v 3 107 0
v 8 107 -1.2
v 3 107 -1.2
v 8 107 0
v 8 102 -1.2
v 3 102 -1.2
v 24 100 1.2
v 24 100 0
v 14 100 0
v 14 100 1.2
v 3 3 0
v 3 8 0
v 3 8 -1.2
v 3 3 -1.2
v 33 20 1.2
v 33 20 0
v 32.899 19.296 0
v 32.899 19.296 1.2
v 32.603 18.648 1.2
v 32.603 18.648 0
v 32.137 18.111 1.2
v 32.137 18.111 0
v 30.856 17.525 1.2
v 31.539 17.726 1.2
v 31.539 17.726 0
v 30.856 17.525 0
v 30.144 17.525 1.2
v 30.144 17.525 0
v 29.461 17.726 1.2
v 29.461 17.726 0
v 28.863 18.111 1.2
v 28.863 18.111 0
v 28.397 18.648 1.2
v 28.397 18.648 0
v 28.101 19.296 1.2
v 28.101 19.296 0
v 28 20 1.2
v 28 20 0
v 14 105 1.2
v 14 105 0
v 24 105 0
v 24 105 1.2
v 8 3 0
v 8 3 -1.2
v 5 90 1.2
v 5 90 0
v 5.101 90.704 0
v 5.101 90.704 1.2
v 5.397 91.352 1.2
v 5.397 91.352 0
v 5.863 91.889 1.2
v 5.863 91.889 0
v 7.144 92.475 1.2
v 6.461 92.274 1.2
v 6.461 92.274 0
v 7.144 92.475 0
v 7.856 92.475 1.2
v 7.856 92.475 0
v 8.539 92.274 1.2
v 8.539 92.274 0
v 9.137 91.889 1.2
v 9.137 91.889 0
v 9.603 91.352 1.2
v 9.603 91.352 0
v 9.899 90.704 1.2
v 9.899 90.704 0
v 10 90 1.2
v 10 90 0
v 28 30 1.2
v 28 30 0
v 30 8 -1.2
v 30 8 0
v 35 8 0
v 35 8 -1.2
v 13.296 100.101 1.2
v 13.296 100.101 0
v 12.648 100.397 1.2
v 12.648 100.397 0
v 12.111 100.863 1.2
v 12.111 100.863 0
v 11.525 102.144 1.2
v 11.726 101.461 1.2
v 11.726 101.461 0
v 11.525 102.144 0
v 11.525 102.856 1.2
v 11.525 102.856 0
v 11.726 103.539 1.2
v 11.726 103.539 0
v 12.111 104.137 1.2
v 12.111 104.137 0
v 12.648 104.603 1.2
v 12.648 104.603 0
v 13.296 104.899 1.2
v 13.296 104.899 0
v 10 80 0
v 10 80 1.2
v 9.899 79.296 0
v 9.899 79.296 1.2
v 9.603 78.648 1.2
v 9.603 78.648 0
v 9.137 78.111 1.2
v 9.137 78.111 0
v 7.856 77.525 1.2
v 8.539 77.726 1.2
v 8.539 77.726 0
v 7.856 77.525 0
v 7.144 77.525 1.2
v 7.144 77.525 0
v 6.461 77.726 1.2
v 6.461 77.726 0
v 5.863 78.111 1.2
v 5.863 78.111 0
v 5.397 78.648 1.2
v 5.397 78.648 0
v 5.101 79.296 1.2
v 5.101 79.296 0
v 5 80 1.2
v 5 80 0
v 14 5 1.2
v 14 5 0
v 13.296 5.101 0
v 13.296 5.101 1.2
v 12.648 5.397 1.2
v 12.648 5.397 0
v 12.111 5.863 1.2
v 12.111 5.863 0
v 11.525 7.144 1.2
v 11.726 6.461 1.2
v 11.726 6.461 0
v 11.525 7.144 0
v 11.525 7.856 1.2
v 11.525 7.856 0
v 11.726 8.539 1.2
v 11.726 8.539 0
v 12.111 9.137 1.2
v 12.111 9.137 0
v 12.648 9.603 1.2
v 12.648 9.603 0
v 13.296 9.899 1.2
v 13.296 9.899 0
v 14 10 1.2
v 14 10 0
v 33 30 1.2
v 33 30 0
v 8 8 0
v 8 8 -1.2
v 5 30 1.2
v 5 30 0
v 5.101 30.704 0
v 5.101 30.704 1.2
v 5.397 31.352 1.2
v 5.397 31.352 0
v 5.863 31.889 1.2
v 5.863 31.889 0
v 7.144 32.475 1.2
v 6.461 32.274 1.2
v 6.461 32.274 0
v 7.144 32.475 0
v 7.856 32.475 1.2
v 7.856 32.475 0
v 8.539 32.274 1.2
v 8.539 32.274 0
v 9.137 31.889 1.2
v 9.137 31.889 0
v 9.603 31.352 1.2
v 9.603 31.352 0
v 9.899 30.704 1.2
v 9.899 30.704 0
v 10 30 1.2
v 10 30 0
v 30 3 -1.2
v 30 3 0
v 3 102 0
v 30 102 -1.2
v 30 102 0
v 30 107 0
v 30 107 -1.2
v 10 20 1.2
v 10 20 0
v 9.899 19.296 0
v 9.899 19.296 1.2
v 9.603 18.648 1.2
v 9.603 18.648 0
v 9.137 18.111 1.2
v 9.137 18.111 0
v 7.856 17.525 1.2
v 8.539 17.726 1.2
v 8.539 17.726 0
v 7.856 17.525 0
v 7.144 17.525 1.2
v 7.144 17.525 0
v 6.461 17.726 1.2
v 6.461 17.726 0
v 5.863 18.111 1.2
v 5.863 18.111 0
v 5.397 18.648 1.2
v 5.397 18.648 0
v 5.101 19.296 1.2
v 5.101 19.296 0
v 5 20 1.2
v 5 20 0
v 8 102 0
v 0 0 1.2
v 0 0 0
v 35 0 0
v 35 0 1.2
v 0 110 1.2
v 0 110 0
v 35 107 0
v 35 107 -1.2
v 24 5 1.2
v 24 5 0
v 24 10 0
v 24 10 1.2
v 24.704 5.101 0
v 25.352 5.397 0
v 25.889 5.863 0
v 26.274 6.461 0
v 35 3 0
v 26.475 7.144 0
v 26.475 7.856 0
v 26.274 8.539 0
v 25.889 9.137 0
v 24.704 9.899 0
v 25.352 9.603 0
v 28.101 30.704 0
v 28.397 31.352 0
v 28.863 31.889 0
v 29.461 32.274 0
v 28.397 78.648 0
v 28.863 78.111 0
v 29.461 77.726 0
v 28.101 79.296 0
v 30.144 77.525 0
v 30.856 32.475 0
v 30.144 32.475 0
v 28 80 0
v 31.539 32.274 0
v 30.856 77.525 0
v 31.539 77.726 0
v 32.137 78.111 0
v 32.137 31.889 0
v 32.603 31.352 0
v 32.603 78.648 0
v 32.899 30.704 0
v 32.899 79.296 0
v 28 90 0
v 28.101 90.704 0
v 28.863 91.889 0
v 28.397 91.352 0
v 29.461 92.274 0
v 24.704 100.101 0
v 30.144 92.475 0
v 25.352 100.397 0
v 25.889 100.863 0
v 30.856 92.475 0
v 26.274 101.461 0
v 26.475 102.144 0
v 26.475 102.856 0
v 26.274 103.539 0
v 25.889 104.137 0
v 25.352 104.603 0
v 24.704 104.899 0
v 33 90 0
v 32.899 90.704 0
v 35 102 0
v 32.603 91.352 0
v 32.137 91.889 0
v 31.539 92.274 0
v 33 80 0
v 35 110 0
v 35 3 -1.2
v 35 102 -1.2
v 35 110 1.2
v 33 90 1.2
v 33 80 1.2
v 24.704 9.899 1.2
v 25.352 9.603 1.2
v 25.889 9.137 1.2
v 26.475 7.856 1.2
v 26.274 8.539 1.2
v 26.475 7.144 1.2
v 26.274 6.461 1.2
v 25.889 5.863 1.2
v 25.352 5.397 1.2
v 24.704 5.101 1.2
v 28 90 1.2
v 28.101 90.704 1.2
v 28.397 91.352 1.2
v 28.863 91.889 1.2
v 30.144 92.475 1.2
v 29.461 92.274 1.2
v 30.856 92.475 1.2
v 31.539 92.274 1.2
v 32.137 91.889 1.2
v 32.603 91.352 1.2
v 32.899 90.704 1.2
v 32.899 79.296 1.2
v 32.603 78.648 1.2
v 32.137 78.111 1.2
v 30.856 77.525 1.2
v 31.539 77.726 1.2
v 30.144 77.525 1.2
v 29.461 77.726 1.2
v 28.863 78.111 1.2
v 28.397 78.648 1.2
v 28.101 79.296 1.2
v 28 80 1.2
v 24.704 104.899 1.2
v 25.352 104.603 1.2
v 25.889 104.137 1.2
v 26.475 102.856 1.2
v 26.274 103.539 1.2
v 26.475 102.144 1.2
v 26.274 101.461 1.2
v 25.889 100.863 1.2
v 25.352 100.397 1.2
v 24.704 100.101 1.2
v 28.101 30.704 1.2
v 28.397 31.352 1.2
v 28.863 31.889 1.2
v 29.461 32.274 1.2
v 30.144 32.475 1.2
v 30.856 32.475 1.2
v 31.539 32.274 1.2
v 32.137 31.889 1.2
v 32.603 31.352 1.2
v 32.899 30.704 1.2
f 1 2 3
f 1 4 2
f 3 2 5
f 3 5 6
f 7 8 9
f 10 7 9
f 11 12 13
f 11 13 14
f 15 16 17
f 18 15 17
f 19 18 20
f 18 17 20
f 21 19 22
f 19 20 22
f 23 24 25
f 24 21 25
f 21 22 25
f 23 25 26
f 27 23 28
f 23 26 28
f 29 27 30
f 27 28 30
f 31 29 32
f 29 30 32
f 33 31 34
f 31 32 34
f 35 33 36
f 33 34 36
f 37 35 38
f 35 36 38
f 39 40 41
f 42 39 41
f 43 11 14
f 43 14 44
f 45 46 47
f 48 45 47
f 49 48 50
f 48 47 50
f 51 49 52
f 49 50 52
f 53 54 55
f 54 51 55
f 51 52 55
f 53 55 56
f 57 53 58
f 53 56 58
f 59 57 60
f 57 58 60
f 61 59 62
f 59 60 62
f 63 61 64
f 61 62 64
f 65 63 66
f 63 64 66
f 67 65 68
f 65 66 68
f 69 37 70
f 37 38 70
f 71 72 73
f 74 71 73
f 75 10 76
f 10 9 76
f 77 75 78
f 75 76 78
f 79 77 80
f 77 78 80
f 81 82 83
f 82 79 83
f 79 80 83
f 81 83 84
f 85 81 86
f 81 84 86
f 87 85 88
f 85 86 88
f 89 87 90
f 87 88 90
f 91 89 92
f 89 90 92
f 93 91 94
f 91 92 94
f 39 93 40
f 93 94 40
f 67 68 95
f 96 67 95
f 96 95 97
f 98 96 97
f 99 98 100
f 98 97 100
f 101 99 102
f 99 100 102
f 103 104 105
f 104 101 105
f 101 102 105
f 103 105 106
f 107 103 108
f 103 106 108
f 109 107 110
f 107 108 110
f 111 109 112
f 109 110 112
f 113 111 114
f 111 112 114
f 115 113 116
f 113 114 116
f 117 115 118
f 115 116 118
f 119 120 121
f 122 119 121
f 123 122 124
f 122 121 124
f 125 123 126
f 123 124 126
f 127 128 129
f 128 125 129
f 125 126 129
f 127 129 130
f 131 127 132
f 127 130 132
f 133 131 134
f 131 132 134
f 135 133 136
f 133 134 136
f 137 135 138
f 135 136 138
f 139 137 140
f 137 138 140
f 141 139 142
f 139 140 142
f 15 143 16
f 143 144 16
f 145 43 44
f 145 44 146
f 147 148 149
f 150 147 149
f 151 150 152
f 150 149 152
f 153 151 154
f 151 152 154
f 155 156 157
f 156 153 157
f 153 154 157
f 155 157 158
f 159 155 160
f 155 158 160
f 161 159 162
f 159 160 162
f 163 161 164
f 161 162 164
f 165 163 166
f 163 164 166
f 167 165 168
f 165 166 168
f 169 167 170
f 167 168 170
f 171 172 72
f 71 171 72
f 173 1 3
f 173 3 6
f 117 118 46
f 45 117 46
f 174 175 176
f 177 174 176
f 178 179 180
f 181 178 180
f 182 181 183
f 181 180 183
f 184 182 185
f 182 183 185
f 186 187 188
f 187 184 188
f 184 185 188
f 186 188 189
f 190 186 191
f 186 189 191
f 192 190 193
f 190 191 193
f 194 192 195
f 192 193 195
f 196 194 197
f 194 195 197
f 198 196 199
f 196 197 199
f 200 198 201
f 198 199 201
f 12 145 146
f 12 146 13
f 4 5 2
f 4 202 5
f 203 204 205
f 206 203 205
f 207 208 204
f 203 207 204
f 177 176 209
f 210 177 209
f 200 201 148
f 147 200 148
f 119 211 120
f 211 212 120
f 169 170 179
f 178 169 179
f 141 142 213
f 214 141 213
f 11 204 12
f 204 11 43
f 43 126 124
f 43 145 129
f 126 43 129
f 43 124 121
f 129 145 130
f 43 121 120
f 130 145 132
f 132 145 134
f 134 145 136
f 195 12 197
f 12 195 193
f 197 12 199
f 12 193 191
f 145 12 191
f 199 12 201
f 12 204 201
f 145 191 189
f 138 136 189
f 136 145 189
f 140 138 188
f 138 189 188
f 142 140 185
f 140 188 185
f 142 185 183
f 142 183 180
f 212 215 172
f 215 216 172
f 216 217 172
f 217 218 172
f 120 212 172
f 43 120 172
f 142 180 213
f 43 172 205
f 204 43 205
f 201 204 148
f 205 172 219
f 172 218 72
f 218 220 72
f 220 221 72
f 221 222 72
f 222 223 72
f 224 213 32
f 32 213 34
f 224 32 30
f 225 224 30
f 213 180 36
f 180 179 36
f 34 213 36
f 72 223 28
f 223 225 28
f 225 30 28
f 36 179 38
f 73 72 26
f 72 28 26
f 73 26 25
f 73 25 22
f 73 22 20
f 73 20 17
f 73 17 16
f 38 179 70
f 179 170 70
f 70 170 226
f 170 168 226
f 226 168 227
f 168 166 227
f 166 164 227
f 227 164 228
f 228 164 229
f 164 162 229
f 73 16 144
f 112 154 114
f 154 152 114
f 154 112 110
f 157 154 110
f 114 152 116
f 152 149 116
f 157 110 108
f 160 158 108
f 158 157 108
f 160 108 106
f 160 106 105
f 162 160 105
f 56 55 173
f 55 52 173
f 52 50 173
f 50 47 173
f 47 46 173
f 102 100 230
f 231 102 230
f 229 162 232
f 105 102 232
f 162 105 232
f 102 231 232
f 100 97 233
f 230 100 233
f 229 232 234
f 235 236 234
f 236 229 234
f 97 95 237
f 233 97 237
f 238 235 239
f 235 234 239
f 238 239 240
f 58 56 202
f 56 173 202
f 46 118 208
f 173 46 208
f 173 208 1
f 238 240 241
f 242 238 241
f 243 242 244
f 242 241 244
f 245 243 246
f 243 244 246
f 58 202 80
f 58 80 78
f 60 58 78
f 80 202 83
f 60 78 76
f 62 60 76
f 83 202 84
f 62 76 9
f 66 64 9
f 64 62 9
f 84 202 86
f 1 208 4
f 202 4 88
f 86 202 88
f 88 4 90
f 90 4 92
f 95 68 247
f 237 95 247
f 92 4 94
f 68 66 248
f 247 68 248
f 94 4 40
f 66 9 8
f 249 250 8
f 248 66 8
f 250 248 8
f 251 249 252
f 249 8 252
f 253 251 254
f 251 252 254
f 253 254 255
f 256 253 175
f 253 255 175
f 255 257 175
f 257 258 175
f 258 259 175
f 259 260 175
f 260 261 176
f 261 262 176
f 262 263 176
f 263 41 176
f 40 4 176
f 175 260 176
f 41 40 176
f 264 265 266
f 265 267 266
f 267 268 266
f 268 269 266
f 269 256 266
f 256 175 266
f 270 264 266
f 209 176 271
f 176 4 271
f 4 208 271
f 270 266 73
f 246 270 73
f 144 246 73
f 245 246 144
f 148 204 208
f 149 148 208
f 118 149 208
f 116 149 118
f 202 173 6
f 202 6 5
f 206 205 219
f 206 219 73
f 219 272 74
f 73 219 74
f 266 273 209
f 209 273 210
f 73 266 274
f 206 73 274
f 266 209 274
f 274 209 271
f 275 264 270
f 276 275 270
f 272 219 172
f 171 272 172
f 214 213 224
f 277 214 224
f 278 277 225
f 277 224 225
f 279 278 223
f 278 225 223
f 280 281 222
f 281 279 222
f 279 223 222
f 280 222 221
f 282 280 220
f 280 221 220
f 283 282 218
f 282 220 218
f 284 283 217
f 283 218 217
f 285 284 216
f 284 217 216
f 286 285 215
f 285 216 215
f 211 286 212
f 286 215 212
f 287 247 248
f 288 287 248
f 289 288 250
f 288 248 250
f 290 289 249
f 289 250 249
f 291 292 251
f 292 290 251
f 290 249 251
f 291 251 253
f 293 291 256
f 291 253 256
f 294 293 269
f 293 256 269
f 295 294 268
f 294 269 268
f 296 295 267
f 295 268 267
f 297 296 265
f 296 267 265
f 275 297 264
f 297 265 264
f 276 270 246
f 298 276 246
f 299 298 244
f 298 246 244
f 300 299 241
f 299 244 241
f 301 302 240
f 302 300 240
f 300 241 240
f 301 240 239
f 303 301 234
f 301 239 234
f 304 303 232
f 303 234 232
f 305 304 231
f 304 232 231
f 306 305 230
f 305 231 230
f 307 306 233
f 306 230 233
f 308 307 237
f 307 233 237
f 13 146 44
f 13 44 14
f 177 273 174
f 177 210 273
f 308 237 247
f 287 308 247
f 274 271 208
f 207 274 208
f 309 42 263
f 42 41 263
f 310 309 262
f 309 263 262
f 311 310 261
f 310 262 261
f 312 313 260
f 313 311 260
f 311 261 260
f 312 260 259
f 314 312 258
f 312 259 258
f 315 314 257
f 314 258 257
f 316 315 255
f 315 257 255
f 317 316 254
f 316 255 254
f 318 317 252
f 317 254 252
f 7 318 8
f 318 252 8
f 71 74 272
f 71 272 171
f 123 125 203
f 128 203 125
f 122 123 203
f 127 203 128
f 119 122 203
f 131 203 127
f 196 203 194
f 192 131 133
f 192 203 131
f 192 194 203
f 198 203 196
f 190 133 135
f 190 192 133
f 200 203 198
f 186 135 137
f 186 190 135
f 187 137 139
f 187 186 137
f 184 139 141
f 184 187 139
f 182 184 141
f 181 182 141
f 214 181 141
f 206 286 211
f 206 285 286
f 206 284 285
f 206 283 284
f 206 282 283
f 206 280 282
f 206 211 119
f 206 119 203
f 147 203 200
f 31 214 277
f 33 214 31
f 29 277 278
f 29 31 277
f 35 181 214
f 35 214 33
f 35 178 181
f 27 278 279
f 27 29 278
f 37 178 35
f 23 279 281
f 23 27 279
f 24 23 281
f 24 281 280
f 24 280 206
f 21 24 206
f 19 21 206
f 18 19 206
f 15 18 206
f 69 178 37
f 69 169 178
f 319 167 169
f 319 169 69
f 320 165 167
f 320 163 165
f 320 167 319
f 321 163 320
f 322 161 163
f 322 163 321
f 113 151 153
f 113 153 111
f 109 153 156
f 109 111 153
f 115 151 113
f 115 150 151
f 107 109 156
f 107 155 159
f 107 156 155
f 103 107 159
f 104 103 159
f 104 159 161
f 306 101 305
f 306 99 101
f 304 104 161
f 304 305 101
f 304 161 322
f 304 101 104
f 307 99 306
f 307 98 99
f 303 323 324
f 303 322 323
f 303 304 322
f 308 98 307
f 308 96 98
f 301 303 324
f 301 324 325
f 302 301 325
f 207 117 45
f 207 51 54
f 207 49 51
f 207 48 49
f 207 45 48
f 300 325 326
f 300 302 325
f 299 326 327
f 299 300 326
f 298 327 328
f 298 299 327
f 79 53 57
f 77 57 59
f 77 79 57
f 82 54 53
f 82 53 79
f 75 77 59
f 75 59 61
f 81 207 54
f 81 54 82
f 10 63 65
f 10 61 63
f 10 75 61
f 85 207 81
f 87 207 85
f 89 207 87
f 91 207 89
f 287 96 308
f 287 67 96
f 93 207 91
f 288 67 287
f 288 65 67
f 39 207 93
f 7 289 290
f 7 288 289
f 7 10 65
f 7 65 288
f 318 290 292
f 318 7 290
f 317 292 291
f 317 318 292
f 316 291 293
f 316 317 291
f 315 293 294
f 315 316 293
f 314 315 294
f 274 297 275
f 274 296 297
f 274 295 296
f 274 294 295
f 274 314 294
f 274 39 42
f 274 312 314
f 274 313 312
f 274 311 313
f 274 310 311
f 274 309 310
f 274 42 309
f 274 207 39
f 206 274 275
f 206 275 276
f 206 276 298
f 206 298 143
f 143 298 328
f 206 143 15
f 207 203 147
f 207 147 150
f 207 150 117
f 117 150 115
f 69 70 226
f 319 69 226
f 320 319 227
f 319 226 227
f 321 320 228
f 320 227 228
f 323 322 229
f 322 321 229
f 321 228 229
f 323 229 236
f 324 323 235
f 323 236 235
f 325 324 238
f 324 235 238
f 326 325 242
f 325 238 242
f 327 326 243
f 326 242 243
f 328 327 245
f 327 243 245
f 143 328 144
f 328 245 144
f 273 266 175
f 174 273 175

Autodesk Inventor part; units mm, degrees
ref_plane "YZ Plane" through (0, 0, 0) normal (1, 0, 0) x (0, 1, 0)
ref_plane "XZ Plane" through (0, 0, 0) normal (0, 1, 0) x (-1, 0, 0)
ref_plane "XY Plane" through (0, 0, 0) normal (0, 0, 1) x (1, 0, 0)
sketch "Skizze1" plane through (0, 0, 0) normal (0, 0, 1) x (1, 0, 0)
  line L0 (0, 0) -> (35, 0)
  line L1 (35, 0) -> (35, 110)
  line L2 (35, 110) -> (0, 110)
  line L3 (0, 110) -> (0, 0)
  line L4 (14, 105) -> (24, 105)
  line L5 (24, 105) -> (24, 100) construction
  line L6 (24, 100) -> (14, 100)
  line L7 (14, 100) -> (14, 105) construction
  line L8 (14, 10) -> (24, 10)
  line L9 (24, 10) -> (24, 5) construction
  line L10 (24, 5) -> (14, 5)
  line L11 (14, 5) -> (14, 10) construction
  line L12 (5, 90) -> (10, 90) construction
  line L13 (10, 90) -> (10, 80)
  line L14 (10, 80) -> (5, 80) construction
  line L15 (5, 80) -> (5, 90)
  line L16 (5, 30) -> (10, 30) construction
  line L17 (10, 30) -> (10, 20)
  line L18 (10, 20) -> (5, 20) construction
  line L19 (5, 20) -> (5, 30)
  line L20 (28, 90) -> (33, 90) construction
  line L21 (33, 90) -> (33, 80)
  line L22 (33, 80) -> (28, 80) construction
  line L23 (28, 80) -> (28, 90)
  line L24 (28, 30) -> (33, 30) construction
  line L25 (33, 30) -> (33, 20)
  line L26 (33, 20) -> (28, 20) construction
  line L27 (28, 20) -> (28, 30)
  line L28 (10, 80) -> (10, 30) construction
  line L29 (0, 55) -> (35, 55) construction
  arc A0 (5, 80) -> (10, 80) centre (7.5, 80) ccw
  arc A1 (10, 90) -> (5, 90) centre (7.5, 90) ccw
  arc A2 (33, 90) -> (28, 90) centre (30.5, 90) ccw
  arc A3 (28, 80) -> (33, 80) centre (30.5, 80) ccw
  arc A4 (24, 5) -> (24, 10) centre (24, 7.5) ccw
  arc A5 (14, 10) -> (14, 5) centre (14, 7.5) ccw
  arc A6 (5, 20) -> (10, 20) centre (7.5, 20) ccw
  arc A7 (28, 20) -> (33, 20) centre (30.5, 20) ccw
  arc A8 (33, 30) -> (28, 30) centre (30.5, 30) ccw
  arc A9 (10, 30) -> (5, 30) centre (7.5, 30) ccw
  arc A10 (24, 100) -> (24, 105) centre (24, 102.5) ccw
  arc A11 (14, 105) -> (14, 100) centre (14, 102.5) ccw
  line L30 (19, 10) -> (19, 100) construction
  line L31 (10, 85) -> (28, 85) construction
  point P0 (10, 55)
  point P1 (19, 85)
  dimension "d0" = 35
  dimension "d1" = 110
  dimension "d4" = 10
  dimension "d5" = 10
  dimension "d6" = 10
  dimension "d7" = 5
  dimension "d8" = 5
  dimension "d9" = 5
  dimension "d10" = 5
  dimension "d11" = 5
  dimension "d12" = 2
  dimension "d13" = 5
  dimension "d14" = 50
  dimension "d15" = 5
extrude "Extrusion2" add sketch "Skizze1" along normal blind 1.2
sketch "Skizze2" plane through (0, 0, 0) normal (0, 0, -1) x (-1, 0, 0)
  arc A0 (-28, 30) -> (-33, 30) centre (-30.5, 30) ccw construction
  line L0 (-28, 30) -> (-28, 20) construction
  arc A1 (-33, 20) -> (-28, 20) centre (-30.5, 20) ccw construction
  line L1 (-33, 20) -> (-33, 30) construction
  arc A2 (-28, 90) -> (-33, 90) centre (-30.5, 90) ccw construction
  line L2 (-28, 90) -> (-28, 80) construction
  arc A3 (-33, 80) -> (-28, 80) centre (-30.5, 80) ccw construction
  line L3 (-33, 80) -> (-33, 90) construction
  arc A4 (-5, 30) -> (-10, 30) centre (-7.5, 30) ccw construction
  line L4 (-5, 30) -> (-5, 20) construction
  arc A5 (-10, 20) -> (-5, 20) centre (-7.5, 20) ccw construction
  line L5 (-10, 20) -> (-10, 30) construction
  arc A6 (-5, 90) -> (-10, 90) centre (-7.5, 90) ccw construction
  line L6 (-5, 90) -> (-5, 80) construction
  arc A7 (-10, 80) -> (-5, 80) centre (-7.5, 80) ccw construction
  line L7 (-10, 80) -> (-10, 90) construction
  arc A8 (-24, 10) -> (-24, 5) centre (-24, 7.5) ccw construction
  line L8 (-24, 10) -> (-14, 10) construction
  arc A9 (-14, 5) -> (-14, 10) centre (-14, 7.5) ccw construction
  line L9 (-14, 5) -> (-24, 5) construction
  arc A10 (-24, 105) -> (-24, 100) centre (-24, 102.5) ccw construction
  line L10 (-24, 105) -> (-14, 105) construction
  arc A11 (-14, 100) -> (-14, 105) centre (-14, 102.5) ccw construction
  line L11 (-14, 100) -> (-24, 100) construction
  line L12 (0, 0) -> (-35, 0) construction
  line L13 (0, 110) -> (0, 0) construction
  line L14 (-35, 110) -> (0, 110) construction
  line L15 (-35, 0) -> (-35, 110) construction
  line L16 (-35, 3) -> (-30, 3)
  line L17 (-30, 3) -> (-30, 8)
  line L18 (-30, 8) -> (-35, 8)
  line L19 (-35, 8) -> (-35, 3)
  line L20 (-3, 3) -> (-8, 3)
  line L21 (-8, 3) -> (-8, 8)
  line L22 (-8, 8) -> (-3, 8)
  line L23 (-3, 8) -> (-3, 3)
  line L24 (-3, 102) -> (-8, 102)
  line L25 (-8, 102) -> (-8, 107)
  line L26 (-8, 107) -> (-3, 107)
  line L27 (-3, 107) -> (-3, 102)
  line L28 (-30, 107) -> (-35, 107)
  line L29 (-35, 107) -> (-35, 102)
  line L30 (-35, 102) -> (-30, 102)
  line L31 (-30, 102) -> (-30, 107)
  dimension "d18" = 5
  dimension "d19" = 5
  dimension "d20" = 5
  dimension "d21" = 5
  dimension "d22" = 3
  dimension "d23" = 0
  dimension "d24" = 3
  dimension "d25" = 3
extrude "Extrusion3" add sketch "Skizze2" along normal blind 1.2
properties part number "bett_V3_teil2_deckplatte_real" material "Holz (Walnuss)"
